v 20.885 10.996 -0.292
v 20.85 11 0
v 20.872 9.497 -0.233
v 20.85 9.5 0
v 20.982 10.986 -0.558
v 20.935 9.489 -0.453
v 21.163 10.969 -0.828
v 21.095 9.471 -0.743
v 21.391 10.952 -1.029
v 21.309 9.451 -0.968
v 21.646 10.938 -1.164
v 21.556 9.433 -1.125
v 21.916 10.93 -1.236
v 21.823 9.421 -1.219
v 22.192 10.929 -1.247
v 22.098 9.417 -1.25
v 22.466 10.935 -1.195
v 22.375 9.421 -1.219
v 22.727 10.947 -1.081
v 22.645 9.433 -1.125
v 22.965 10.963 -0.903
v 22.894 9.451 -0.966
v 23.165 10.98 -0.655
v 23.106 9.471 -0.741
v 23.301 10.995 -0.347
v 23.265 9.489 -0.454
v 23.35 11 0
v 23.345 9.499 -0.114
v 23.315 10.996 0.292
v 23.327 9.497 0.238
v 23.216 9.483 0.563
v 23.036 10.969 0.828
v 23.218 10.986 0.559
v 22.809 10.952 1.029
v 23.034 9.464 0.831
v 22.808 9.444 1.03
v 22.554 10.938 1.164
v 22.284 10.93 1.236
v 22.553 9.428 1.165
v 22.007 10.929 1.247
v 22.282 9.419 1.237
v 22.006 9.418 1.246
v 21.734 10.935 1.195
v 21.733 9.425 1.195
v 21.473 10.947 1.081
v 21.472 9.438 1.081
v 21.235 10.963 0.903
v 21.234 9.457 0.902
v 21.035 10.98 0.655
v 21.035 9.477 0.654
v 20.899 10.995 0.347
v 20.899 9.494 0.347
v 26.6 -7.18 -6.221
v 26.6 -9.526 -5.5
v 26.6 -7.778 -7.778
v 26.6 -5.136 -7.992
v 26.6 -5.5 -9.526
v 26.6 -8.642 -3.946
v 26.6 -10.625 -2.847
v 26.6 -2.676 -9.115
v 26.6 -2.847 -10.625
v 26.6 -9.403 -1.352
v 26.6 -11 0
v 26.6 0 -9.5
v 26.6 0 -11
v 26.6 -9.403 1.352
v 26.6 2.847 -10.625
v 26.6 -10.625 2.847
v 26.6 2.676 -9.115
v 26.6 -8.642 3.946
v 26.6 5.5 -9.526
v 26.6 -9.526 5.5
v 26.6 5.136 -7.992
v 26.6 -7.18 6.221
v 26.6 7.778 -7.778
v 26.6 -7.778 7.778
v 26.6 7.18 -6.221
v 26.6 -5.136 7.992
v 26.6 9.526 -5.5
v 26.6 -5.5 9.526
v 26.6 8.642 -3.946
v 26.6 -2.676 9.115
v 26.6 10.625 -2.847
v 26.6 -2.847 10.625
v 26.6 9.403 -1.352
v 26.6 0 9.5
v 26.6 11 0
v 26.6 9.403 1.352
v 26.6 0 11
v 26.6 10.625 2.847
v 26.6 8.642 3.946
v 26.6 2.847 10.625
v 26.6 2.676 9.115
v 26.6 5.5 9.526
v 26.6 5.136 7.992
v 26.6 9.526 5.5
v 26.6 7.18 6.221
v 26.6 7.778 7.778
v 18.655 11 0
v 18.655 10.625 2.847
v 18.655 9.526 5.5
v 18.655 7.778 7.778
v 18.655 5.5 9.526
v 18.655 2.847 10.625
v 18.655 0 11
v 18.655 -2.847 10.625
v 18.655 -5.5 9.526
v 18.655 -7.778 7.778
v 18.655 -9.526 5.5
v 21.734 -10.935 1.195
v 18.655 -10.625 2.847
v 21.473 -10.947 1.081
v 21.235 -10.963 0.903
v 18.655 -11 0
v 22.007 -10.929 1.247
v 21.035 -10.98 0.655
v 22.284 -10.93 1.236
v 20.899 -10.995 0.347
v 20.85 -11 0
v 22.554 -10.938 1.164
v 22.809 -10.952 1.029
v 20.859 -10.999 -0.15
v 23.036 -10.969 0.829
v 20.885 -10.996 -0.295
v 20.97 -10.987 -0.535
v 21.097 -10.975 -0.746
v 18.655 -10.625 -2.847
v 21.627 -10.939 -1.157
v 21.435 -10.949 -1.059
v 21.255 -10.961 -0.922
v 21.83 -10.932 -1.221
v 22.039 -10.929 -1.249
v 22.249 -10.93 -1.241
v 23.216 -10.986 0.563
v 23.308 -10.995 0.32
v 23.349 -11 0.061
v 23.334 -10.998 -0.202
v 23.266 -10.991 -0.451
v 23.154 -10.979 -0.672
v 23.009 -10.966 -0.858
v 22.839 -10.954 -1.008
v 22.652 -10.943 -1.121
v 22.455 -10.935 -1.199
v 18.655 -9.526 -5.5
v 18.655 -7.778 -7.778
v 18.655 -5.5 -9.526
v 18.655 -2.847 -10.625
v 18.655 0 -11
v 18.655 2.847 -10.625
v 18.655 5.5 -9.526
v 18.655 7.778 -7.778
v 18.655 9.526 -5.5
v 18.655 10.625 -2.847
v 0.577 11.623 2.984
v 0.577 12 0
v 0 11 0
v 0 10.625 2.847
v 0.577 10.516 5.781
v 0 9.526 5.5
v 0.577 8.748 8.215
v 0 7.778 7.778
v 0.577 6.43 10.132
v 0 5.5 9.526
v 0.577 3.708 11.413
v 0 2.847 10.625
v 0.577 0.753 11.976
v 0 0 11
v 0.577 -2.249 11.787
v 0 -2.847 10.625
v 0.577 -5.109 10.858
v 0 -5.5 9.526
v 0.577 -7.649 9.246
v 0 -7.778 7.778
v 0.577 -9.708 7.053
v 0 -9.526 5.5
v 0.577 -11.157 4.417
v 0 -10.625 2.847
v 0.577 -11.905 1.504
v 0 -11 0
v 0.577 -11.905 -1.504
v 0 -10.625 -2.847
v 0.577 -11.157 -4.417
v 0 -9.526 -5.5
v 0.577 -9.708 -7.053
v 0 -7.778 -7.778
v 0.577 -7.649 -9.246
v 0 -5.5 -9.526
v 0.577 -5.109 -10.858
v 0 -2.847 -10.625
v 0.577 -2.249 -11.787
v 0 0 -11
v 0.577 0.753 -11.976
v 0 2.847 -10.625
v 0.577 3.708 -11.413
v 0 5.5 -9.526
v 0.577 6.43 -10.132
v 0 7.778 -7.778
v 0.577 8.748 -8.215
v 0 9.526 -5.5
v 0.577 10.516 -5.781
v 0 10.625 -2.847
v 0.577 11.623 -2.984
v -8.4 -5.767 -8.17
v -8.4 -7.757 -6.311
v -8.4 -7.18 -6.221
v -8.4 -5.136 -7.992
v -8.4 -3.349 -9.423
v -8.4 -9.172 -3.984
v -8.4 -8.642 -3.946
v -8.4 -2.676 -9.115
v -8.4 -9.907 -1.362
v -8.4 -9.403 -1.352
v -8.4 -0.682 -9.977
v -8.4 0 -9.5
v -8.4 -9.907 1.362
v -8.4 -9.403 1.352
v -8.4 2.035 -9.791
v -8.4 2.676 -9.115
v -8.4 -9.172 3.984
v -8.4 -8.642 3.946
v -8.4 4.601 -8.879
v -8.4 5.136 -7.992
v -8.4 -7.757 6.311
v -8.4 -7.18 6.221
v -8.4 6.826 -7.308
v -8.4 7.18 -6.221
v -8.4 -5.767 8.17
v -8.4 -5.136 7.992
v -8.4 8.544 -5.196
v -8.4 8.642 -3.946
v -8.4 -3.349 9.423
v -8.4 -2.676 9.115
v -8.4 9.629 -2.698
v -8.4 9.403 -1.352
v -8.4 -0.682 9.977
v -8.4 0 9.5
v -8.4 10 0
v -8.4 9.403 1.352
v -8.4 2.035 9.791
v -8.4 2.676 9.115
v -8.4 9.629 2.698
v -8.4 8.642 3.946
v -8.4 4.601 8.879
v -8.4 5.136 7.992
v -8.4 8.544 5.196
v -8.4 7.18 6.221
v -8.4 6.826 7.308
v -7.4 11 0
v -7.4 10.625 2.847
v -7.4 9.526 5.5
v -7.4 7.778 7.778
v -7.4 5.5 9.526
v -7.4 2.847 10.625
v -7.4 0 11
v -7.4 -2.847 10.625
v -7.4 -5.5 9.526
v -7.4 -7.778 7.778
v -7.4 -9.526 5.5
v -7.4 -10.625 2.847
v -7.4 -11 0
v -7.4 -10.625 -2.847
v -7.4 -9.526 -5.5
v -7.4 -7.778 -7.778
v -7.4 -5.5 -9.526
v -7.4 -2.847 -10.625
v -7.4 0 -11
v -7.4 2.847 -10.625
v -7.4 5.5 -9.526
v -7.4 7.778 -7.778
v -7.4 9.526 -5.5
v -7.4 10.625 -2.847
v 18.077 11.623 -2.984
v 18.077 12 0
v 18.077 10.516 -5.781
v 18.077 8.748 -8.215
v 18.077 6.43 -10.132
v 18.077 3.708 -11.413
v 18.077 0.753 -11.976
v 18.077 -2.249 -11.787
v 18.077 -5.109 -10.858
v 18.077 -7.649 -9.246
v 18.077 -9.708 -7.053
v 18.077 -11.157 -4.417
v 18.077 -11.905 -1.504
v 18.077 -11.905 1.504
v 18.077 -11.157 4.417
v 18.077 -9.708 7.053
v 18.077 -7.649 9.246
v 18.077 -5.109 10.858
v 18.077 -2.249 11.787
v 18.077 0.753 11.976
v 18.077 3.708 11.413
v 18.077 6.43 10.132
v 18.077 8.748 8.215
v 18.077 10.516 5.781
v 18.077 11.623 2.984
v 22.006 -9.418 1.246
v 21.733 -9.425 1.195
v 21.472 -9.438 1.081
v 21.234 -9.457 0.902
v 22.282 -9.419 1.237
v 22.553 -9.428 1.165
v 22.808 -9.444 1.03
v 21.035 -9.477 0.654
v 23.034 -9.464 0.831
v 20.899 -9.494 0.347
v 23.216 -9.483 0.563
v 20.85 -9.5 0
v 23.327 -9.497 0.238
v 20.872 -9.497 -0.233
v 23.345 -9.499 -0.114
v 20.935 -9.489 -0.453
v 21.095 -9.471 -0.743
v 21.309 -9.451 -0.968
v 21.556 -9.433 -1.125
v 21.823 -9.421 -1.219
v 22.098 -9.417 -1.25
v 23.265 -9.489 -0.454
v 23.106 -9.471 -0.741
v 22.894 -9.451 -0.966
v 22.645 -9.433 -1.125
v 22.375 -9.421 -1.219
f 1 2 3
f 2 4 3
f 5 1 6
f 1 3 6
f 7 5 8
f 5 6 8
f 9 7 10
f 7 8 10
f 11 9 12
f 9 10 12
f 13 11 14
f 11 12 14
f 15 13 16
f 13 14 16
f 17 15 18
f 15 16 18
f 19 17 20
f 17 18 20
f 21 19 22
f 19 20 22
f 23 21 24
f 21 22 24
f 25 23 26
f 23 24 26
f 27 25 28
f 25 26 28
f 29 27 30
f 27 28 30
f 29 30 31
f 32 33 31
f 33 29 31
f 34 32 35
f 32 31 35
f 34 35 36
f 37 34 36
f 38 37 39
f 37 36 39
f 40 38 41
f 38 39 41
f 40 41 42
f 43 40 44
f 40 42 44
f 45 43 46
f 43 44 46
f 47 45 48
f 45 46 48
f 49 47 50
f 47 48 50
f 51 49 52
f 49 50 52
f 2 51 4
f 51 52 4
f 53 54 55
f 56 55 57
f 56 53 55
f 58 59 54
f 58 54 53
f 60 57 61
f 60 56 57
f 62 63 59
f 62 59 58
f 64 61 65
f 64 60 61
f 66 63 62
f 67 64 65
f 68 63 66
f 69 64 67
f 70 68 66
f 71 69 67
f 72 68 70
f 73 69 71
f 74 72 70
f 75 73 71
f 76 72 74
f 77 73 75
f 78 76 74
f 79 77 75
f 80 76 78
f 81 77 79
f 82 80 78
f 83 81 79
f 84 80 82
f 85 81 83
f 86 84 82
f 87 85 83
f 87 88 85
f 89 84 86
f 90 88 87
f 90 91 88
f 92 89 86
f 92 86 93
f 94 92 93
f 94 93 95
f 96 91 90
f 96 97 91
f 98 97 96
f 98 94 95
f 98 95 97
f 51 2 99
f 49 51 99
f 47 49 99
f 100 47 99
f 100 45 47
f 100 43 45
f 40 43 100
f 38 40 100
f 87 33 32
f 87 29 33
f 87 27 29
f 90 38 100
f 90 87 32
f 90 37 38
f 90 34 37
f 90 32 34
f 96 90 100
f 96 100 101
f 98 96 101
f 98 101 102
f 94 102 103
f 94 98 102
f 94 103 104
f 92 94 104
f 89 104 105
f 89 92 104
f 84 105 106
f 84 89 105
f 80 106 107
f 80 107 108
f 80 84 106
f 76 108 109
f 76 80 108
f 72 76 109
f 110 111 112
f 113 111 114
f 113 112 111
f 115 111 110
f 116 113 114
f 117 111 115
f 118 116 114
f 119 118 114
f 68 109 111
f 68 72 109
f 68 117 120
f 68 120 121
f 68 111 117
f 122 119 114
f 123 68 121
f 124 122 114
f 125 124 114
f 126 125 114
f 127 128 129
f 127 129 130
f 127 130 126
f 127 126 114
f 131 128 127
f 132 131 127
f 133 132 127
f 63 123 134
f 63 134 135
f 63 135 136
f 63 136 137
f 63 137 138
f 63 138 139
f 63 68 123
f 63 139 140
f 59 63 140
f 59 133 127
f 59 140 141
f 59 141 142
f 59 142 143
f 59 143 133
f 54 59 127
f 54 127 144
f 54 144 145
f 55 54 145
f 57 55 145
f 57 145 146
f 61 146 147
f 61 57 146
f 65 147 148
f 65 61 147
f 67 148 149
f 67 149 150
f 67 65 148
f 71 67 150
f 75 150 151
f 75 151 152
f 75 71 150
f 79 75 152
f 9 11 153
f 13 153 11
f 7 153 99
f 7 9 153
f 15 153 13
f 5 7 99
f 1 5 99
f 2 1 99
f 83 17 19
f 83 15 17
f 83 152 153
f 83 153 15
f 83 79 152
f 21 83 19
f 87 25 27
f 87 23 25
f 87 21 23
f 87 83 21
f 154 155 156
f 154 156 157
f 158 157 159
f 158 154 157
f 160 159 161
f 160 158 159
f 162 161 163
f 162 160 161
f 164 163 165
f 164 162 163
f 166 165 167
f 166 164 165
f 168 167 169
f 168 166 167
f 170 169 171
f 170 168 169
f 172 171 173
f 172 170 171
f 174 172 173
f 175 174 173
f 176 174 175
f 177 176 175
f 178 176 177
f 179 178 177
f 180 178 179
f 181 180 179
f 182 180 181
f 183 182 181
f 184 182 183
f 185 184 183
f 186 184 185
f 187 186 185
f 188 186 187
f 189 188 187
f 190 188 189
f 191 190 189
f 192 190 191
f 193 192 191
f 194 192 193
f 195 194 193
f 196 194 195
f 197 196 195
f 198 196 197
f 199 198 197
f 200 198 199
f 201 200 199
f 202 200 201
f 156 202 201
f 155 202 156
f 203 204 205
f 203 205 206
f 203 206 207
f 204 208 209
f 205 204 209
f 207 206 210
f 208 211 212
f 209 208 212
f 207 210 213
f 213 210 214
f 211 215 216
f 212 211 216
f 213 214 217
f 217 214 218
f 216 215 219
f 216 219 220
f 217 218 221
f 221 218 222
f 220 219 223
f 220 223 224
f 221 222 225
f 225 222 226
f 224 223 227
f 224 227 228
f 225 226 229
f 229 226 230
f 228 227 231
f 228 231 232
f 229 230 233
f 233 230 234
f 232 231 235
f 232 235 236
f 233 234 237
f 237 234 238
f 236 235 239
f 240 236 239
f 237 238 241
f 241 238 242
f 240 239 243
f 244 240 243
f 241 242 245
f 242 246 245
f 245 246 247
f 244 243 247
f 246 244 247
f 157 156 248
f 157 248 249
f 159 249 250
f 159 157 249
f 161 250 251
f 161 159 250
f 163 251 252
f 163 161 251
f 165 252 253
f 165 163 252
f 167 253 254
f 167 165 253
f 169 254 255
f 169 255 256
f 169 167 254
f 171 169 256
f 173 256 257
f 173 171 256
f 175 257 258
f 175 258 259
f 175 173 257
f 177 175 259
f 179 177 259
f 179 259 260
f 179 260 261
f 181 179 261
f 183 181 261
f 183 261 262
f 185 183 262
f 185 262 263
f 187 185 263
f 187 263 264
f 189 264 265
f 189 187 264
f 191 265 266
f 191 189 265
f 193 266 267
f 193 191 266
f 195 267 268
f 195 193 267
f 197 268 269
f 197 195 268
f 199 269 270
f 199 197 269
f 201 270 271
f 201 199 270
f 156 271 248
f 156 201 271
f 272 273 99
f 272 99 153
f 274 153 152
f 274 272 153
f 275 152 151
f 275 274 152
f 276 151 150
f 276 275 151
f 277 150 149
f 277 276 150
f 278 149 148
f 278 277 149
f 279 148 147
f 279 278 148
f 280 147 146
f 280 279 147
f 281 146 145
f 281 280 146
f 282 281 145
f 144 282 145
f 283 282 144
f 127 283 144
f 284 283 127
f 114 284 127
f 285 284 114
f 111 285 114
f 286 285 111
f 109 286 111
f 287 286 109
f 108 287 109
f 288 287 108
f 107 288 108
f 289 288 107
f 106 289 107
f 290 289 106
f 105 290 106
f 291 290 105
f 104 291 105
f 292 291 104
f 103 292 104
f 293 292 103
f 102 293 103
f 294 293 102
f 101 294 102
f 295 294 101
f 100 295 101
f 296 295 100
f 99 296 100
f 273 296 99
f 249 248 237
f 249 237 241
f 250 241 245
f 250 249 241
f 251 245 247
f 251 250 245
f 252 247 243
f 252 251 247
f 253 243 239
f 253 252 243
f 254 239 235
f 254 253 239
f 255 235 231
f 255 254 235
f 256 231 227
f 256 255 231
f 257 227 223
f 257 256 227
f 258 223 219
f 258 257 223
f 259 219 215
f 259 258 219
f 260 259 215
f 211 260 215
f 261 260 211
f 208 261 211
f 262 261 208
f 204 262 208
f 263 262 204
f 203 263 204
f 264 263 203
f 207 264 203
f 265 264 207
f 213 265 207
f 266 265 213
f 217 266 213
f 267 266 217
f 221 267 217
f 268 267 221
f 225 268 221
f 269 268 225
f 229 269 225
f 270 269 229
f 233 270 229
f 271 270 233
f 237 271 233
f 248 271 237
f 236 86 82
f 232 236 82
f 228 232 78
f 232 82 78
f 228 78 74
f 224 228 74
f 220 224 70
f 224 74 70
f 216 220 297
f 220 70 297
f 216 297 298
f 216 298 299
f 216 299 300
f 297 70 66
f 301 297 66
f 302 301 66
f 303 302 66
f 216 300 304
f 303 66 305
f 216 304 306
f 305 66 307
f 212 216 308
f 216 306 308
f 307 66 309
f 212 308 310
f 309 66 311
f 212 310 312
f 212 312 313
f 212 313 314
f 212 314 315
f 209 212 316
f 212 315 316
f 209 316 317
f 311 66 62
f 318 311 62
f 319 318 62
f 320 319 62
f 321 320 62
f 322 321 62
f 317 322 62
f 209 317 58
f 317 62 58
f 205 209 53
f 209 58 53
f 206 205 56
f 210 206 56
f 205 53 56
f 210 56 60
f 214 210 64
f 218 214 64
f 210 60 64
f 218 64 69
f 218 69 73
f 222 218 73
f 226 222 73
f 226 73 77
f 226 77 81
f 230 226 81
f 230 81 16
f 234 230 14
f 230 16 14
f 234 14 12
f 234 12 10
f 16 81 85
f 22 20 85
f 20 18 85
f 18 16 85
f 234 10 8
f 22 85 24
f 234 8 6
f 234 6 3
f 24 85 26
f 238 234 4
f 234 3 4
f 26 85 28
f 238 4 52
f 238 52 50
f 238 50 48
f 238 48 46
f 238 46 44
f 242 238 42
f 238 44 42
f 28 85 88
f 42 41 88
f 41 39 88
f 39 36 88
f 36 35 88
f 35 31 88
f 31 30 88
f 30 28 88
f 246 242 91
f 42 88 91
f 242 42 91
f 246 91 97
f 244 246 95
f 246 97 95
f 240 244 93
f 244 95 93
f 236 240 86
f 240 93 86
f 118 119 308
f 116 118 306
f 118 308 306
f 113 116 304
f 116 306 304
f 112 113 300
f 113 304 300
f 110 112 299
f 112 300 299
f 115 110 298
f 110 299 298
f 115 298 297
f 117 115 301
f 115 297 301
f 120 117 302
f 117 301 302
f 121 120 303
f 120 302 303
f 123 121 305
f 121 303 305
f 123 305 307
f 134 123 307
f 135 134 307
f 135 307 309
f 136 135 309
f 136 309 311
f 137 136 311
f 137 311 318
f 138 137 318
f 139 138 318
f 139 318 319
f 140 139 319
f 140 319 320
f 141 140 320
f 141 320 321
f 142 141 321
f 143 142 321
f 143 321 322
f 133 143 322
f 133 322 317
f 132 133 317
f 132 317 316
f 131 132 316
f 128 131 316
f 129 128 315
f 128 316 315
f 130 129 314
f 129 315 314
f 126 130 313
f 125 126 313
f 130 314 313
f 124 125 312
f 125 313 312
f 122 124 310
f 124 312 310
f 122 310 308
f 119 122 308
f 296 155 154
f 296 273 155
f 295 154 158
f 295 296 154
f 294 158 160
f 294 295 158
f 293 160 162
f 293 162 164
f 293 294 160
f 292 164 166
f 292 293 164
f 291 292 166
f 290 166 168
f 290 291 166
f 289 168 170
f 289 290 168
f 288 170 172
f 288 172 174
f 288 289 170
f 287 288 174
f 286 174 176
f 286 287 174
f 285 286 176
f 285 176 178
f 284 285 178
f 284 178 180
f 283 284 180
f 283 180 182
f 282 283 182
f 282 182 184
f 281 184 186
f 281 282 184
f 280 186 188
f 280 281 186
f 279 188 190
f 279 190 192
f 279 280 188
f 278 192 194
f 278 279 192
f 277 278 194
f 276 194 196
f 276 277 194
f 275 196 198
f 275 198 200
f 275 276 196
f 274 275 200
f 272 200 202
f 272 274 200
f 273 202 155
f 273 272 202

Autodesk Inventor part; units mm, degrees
ref_plane "YZ Plane" through (0, 0, 0) normal (1, 0, 0) x (0, 1, 0)
ref_plane "XZ Plane" through (0, 0, 0) normal (0, 1, 0) x (-1, 0, 0)
ref_plane "XY Plane" through (0, 0, 0) normal (0, 0, 1) x (1, 0, 0)
sketch "Profile" plane through (0, 0, 0) normal (0, 0, 1) x (1, 0, 0)
  line L0 (-8.4, 0) -> (-8.4, 11)
  line L1 (-8.4, 11) -> (0, 11)
  line L2 (0, 11) -> (0.5774, 12)
  line L3 (0.5774, 12) -> (18.0774, 12)
  line L4 (18.0774, 12) -> (18.6547, 11)
  line L5 (18.6547, 11) -> (26.6, 11)
  line L6 (26.6, 11) -> (26.6, 0)
  line L7 (-8.4, 0) -> (0, 0)
  line L8 (0, 0) -> (0, 9)
  line L9 (0, 9) -> (18.6, 9)
  line L10 (18.6, 9) -> (18.6, 0)
  line L11 (18.6, 0) -> (26.6, 0)
  line L12 (-15.4, 0) -> (33.6, 0) construction
  line L13 (0, 11) -> (0, 9) construction
  dimension "BodyLength" = 35
  dimension "d1" = 11
  dimension "d3" = 120
  dimension "d4" = 120
  dimension "d5" = 17.5
  dimension "d6" = 8.4
  dimension "d16" = 8
  dimension "d29" = 1
  dimension "d30" = 9
revolve "ProfileRevolveFeature" add sketch "Profile" angle 360 about axis through (-10, 0, 0) along (1, 0, 0)
sketch "InsideHole" plane through (-8.4, 0, 0) normal (-1, 0, 0) x (0, 0, 1)
  circle A0 centre (0, 0) radius 9 construction
hole "InsideHoleFeature" at (-8.4, 0, 0) direction (1, 0, 0) diameter 19 end through all
chamfer "EndChamferFeature" distance 1 angle 45 1 edges at (-8.4, -11, 0)
sketch "CapMountHole" plane through (0, 0, 0) normal (0, 1, 0) x (-1, 0, 0)
  line L0 (-26.6, 11) -> (-26.6, -11) construction
  line L1 (7.6, 0) -> (-45.6, 0) construction
  circle A0 centre (-22.1, 0) radius 1.25
  point P0 (0, 0)
  dimension "d31" = 4.5
  dimension "d39" = 2.5
extrude "CapMountHoleFeature" cut sketch "CapMountHole" along normal through all both and the other way through all
equation "\"d5\" = 0.5 * BodyLength"
equation "\"d6\" = 0.24 * BodyLength"
properties part number "BackPair1PistonBody"
